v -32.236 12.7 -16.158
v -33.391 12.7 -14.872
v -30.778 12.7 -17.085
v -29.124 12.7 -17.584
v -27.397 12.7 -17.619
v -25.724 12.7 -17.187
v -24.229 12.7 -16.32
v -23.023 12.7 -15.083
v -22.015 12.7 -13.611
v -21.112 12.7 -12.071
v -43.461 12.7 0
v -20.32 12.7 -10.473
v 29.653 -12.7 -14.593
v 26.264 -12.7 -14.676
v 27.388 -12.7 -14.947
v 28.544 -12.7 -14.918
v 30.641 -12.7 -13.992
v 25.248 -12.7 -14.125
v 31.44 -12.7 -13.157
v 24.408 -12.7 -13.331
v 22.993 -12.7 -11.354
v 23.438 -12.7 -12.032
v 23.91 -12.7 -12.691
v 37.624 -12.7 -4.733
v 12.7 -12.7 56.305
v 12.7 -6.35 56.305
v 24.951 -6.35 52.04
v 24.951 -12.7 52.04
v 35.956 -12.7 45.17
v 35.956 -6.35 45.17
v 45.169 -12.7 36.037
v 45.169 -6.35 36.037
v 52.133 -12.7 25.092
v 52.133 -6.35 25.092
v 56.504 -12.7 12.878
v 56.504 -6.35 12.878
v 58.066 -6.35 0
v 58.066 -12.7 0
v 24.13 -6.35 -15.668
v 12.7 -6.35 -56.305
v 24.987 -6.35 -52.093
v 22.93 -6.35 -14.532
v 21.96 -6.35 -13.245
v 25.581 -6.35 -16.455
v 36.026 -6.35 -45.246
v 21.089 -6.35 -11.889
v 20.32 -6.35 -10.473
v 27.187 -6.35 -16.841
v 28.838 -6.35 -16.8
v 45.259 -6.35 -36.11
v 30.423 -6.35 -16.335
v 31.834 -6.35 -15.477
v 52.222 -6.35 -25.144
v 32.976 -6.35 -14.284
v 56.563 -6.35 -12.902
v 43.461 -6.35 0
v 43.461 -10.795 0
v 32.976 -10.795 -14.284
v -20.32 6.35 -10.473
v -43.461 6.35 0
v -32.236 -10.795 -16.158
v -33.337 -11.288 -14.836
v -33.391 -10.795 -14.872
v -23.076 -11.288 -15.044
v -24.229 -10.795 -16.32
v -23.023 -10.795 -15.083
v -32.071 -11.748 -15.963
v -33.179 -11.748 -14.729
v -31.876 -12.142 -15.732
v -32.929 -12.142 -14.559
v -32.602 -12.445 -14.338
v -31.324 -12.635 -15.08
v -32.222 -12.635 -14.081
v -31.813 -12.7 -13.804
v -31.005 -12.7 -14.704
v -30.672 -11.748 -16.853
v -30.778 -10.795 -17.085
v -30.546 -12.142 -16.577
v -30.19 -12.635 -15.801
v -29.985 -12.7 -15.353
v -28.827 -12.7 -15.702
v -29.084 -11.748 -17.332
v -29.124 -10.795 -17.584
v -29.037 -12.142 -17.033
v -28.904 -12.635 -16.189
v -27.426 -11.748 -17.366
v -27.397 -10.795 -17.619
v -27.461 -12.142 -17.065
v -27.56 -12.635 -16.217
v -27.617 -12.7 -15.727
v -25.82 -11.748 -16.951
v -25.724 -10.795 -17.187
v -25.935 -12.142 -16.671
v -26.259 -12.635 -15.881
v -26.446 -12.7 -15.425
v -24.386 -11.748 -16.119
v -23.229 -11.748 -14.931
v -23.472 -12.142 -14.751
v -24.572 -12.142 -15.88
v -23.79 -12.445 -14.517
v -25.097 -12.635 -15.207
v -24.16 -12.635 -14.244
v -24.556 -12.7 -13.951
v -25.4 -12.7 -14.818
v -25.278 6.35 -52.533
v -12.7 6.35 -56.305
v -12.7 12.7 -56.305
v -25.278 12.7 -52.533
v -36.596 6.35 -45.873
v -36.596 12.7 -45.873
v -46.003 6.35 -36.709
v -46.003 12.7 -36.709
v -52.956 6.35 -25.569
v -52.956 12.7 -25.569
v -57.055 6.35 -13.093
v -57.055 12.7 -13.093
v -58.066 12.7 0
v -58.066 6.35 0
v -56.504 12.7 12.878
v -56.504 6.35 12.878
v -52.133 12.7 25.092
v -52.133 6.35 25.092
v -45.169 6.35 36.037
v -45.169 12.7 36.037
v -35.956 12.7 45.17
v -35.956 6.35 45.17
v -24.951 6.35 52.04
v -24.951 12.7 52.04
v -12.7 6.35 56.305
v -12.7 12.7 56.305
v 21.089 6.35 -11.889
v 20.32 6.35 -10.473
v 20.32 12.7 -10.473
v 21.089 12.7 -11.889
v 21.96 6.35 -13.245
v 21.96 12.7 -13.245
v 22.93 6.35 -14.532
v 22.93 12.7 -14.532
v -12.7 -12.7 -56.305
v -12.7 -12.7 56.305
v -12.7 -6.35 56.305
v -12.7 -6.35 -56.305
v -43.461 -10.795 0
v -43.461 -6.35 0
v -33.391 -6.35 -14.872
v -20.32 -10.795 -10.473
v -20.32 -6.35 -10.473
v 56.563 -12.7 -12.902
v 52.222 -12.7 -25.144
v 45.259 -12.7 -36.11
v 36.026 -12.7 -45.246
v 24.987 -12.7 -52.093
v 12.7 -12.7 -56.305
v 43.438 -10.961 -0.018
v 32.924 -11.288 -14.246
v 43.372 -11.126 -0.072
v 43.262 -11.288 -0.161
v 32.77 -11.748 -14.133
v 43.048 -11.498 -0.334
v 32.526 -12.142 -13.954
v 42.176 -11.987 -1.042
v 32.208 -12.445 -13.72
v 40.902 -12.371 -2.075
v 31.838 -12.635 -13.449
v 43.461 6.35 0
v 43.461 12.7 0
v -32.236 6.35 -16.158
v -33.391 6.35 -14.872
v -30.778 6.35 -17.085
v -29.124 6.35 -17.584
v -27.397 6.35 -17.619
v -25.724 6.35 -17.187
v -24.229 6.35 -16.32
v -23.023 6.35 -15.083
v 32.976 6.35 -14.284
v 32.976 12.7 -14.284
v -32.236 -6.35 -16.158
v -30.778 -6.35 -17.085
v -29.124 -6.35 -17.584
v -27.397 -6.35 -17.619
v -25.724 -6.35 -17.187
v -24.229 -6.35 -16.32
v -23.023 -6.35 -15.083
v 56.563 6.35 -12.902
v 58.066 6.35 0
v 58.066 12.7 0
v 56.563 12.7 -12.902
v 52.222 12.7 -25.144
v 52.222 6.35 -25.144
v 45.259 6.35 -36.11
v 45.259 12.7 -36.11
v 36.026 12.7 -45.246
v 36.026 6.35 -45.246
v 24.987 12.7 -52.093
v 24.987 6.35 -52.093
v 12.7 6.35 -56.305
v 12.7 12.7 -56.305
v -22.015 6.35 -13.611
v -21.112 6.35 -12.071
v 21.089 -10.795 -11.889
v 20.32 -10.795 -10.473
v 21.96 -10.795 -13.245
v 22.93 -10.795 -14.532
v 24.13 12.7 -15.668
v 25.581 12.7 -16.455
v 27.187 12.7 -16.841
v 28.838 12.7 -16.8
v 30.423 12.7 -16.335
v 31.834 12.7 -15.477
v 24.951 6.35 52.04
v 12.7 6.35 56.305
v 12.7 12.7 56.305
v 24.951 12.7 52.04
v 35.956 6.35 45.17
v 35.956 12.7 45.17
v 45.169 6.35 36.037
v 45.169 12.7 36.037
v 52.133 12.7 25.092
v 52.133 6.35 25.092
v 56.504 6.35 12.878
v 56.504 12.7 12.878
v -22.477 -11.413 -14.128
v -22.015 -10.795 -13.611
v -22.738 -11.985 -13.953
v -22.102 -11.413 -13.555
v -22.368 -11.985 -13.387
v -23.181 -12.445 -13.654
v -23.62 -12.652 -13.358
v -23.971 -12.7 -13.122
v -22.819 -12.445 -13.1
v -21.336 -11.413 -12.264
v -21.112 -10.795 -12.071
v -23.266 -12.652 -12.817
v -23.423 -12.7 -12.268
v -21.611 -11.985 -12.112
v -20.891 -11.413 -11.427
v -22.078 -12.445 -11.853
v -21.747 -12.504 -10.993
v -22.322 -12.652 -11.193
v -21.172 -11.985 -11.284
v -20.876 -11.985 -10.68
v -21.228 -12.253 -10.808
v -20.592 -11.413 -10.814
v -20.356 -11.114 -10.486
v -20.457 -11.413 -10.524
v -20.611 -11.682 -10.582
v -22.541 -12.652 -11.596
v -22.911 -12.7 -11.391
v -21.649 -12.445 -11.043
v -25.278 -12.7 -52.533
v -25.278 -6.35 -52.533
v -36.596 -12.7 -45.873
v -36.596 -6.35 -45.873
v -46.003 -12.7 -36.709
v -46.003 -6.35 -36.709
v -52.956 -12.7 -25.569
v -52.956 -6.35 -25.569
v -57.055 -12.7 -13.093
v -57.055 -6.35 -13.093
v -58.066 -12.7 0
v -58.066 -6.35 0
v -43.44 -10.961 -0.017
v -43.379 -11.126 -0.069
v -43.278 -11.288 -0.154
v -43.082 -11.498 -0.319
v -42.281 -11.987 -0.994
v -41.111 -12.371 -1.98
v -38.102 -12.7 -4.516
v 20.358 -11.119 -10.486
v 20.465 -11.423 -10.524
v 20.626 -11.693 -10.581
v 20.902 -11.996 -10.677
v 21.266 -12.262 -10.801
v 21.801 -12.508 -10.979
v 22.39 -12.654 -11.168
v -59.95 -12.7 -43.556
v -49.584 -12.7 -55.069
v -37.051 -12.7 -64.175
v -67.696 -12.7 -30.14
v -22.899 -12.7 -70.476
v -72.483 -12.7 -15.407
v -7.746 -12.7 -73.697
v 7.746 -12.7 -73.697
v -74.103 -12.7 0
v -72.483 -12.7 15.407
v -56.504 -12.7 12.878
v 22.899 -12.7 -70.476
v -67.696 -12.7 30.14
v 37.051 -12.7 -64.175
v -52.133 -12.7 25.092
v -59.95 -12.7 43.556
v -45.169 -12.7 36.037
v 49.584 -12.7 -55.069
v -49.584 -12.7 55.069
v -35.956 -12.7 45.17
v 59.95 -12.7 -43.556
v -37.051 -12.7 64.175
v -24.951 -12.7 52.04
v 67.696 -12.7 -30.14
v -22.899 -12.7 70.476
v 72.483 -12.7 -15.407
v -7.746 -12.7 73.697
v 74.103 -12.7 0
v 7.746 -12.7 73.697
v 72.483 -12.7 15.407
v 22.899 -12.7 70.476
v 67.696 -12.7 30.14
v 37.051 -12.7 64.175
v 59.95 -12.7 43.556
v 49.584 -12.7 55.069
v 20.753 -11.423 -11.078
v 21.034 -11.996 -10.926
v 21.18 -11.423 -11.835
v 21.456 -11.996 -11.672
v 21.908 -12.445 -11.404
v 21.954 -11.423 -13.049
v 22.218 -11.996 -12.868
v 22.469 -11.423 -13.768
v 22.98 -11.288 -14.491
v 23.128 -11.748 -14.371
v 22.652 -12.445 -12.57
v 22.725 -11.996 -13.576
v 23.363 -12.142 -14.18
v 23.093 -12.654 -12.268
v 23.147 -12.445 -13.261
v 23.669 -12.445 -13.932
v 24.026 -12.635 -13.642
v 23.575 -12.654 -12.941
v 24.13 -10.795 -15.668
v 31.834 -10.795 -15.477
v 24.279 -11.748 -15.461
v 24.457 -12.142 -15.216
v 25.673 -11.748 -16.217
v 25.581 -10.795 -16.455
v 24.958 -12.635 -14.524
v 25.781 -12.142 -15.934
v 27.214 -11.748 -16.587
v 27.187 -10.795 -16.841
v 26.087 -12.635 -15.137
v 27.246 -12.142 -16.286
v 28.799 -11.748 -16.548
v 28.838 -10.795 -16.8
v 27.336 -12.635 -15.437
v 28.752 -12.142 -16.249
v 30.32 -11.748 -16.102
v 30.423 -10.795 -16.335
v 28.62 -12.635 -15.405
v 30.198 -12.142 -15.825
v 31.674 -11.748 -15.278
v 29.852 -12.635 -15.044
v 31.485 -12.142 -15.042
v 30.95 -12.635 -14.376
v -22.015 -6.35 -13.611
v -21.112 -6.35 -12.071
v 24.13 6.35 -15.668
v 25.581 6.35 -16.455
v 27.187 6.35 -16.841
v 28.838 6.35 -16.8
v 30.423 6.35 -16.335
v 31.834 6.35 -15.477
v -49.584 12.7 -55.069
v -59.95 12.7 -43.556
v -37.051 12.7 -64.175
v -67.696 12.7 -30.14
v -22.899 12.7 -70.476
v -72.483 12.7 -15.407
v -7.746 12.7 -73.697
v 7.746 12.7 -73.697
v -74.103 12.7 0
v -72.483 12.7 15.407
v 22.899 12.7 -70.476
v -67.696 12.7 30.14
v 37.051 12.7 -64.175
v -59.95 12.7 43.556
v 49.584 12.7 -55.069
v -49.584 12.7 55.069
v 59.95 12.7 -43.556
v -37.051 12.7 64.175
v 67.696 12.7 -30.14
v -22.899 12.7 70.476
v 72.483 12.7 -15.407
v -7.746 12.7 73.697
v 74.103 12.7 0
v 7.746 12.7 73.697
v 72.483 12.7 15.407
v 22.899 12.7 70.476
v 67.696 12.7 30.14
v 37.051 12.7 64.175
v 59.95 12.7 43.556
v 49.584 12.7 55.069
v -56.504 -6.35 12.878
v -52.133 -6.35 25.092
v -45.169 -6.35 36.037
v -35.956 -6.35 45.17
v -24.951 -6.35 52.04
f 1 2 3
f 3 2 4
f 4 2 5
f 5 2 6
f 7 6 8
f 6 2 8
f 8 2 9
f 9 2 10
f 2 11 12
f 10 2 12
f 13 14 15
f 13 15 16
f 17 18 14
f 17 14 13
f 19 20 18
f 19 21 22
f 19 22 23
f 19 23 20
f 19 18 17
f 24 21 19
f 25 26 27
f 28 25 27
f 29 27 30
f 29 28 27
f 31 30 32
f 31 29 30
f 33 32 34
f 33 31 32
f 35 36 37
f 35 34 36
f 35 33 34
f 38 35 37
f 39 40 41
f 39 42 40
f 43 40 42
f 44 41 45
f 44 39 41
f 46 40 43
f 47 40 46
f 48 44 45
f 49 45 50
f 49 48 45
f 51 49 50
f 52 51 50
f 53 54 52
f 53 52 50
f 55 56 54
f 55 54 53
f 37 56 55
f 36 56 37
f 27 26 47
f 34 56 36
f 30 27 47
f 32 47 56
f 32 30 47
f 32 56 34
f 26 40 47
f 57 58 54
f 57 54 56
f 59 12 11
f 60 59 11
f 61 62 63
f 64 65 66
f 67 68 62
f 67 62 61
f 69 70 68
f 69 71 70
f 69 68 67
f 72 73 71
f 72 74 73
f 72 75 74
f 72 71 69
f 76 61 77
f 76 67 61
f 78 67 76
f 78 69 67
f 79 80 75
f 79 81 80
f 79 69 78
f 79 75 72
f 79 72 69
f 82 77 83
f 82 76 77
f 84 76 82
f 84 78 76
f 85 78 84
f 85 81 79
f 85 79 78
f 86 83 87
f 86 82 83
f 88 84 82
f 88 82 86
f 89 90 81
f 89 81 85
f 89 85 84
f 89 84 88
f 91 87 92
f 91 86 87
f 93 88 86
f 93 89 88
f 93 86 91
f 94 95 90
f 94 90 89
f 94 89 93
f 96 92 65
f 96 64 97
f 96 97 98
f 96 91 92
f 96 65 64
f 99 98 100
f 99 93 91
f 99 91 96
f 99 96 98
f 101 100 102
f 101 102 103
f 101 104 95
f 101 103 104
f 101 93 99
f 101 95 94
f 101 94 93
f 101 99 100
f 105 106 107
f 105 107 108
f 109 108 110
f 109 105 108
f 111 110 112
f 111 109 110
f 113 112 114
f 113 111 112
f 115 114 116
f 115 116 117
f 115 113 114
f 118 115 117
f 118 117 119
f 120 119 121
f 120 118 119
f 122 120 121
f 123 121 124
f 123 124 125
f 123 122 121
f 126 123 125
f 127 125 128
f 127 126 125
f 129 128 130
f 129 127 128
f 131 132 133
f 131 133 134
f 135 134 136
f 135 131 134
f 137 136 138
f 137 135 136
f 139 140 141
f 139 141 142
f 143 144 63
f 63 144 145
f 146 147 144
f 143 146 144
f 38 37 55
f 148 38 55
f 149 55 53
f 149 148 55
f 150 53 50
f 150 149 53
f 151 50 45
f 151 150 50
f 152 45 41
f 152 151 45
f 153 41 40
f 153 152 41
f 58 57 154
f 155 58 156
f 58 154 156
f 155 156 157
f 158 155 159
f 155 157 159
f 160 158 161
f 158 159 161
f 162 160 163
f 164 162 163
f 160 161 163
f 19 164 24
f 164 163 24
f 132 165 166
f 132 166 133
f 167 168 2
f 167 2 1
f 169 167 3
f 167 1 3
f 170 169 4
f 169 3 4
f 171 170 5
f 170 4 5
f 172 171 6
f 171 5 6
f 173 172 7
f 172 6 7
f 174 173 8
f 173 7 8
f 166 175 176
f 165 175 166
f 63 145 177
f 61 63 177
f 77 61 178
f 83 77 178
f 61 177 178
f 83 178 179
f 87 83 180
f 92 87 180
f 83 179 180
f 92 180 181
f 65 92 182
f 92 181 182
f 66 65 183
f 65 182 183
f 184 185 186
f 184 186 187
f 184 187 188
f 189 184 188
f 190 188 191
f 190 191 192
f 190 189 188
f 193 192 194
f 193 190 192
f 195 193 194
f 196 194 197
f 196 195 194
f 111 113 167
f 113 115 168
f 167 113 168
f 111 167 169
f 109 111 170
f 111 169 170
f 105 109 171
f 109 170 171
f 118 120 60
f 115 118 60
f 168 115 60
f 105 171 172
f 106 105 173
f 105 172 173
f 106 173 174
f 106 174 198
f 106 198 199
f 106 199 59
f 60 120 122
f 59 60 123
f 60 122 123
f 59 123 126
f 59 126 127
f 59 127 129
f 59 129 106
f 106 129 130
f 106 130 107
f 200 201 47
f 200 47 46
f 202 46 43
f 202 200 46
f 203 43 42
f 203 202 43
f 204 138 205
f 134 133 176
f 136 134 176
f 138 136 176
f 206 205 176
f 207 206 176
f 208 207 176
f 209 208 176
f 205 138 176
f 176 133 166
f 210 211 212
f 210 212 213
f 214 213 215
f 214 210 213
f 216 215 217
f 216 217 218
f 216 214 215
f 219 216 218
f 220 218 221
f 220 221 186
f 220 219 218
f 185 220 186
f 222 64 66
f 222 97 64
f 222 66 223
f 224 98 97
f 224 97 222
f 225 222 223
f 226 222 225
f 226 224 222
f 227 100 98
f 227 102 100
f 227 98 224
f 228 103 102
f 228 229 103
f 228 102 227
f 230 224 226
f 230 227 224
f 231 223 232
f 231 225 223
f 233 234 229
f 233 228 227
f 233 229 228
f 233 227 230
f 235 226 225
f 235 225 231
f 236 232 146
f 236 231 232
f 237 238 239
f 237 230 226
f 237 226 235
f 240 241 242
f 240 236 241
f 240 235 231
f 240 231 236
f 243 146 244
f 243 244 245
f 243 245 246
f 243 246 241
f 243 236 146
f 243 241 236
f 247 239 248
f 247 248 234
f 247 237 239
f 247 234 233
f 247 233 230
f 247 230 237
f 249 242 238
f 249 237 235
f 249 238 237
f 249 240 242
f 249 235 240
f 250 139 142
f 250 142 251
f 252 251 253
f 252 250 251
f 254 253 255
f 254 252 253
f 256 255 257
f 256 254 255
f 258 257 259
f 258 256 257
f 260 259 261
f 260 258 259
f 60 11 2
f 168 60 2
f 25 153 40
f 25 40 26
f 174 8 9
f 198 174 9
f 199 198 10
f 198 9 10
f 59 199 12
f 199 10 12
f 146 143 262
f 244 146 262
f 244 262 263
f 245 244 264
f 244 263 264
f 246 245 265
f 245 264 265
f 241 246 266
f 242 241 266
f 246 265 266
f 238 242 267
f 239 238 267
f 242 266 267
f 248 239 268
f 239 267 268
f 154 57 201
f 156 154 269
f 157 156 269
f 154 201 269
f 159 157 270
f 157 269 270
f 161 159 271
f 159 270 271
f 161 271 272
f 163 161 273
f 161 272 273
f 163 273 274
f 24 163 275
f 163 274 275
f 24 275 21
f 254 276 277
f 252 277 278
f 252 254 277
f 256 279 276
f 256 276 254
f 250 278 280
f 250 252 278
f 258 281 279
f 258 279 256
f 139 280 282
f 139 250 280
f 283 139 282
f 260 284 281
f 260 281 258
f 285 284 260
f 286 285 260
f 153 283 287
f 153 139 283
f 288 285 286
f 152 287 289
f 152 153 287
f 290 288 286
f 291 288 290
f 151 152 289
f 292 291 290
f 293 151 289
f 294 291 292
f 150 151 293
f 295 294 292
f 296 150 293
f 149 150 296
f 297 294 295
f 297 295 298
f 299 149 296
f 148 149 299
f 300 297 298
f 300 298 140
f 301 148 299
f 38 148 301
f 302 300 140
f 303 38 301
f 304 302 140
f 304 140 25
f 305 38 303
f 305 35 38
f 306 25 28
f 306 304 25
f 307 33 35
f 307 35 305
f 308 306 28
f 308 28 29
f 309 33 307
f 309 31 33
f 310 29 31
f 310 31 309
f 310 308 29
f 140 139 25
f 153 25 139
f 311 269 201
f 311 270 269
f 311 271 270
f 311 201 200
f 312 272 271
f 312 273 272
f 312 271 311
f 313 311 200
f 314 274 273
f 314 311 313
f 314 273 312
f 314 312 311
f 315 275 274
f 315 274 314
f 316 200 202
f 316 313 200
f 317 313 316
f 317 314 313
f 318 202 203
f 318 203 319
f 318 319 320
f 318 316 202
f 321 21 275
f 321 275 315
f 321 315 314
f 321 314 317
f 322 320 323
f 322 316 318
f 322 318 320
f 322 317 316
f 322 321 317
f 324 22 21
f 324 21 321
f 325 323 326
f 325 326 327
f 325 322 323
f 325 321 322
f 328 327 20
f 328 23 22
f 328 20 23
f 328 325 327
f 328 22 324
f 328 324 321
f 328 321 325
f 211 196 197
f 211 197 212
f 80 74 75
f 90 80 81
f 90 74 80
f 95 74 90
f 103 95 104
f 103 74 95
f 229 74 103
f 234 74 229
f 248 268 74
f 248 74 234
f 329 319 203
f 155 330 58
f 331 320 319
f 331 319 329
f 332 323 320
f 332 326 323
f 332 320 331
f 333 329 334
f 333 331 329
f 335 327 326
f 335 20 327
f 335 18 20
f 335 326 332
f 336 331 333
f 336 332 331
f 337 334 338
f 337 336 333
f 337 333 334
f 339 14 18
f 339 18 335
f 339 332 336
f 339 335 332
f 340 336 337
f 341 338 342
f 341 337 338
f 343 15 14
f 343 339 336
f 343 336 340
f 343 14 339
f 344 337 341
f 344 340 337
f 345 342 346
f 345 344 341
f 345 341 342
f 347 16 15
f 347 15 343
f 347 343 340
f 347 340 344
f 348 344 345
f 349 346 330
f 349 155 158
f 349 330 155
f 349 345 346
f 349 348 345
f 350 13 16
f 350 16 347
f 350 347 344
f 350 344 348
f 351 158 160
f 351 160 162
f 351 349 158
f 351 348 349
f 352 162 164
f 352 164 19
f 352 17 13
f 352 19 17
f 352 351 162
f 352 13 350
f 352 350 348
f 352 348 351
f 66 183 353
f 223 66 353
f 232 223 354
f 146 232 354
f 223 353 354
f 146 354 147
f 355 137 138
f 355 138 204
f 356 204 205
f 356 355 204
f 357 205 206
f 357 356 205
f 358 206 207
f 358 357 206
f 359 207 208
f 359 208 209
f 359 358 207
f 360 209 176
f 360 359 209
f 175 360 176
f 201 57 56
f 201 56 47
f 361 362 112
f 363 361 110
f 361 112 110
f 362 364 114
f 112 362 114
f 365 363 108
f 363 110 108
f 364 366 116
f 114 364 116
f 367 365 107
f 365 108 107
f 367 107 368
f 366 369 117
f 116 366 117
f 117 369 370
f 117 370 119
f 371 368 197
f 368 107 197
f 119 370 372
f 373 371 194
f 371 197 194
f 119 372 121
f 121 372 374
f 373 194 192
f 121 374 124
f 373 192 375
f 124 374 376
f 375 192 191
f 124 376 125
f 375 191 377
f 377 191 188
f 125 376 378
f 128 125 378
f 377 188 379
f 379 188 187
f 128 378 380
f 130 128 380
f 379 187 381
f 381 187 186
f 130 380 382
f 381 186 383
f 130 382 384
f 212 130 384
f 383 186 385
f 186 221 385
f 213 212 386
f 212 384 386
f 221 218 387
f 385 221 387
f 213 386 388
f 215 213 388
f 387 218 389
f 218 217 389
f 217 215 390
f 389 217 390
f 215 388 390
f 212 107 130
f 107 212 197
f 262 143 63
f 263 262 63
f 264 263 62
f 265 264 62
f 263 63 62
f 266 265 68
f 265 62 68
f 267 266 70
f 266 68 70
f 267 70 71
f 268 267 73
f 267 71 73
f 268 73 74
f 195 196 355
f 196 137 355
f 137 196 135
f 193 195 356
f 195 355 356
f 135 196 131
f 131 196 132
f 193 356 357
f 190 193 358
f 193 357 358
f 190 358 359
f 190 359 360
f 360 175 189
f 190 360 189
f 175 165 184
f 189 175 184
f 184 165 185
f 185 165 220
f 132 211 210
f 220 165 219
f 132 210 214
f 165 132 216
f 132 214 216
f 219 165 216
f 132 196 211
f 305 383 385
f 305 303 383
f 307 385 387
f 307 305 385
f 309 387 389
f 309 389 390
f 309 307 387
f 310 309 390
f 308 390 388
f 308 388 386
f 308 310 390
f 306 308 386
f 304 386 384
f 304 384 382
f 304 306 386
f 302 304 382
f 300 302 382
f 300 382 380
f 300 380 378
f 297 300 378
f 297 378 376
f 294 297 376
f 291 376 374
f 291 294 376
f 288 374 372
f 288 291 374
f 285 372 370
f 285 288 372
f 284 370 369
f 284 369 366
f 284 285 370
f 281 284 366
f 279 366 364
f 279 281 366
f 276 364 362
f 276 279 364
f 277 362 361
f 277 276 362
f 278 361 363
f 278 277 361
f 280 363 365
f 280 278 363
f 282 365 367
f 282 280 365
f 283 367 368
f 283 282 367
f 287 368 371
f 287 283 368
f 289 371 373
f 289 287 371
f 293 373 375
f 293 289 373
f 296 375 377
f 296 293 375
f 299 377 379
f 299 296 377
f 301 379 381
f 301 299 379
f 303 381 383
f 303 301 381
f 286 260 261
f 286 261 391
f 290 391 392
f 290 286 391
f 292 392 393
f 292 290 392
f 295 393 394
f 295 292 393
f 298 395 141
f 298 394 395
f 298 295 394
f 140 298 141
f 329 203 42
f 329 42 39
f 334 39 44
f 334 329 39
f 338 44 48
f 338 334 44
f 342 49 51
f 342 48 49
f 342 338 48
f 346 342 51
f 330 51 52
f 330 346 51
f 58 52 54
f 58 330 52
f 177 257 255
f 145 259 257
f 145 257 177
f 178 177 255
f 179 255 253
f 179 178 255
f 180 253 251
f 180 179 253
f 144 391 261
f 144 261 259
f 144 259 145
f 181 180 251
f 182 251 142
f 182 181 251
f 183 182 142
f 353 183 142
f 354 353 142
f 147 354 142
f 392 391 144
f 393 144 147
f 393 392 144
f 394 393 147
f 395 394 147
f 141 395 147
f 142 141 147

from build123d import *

# Parameters (mm, degrees)
F0_R     = 74.1026
F1_DEPTH = 12.7
F2_DEPTH = 6.35
F3_DEPTH = 12.7
F4_R     = 1.905


with BuildPart() as f1:
    # F0 (on Front) → F1 (new body, symmetric)
    with BuildSketch(Plane.XZ):
        Circle(F0_R)
        with BuildLine():
            Line((12.7, -56.305081), (12.7, 56.305081))
            ThreePointArc((12.7, 56.305081), (45.16875, 36.037206), (58.065501, 0))
            ThreePointArc((58.065501, 0), (45.258761, -36.10973), (12.7, -56.305081))
        make_face(mode=Mode.SUBTRACT)
        with BuildLine():
            ThreePointArc((-58.065501, 0), (-45.16875, 36.037206), (-12.7, 56.305081))
            Line((-12.7, 56.305081), (-12.7, -56.305081))
            ThreePointArc((-12.7, -56.305081), (-46.002553, -36.709009), (-58.065501, 0))
        make_face(mode=Mode.SUBTRACT)
    extrude(amount=F1_DEPTH, both=True)

    # F0 (on Front) → F2 (join, symmetric)
    with BuildSketch(Plane.XZ):
        with BuildLine():
            Line((-12.7, -56.305081), (-12.7, 56.305081))
            ThreePointArc((-12.7, 56.305081), (-45.16875, 36.037206), (-58.065501, 0))
            ThreePointArc((-58.065501, 0), (-46.002553, -36.709009), (-12.7, -56.305081))
        make_face()
        with BuildLine():
            Line((-43.460501, 0), (-20.32, -10.472688))
            ThreePointArc((-20.32, -10.472688), (-21.550138, -12.848968), (-23.023436, -15.082651))
            ThreePointArc((-23.023436, -15.082651), (-28.261599, -17.66068), (-33.390806, -14.872163))
            Line((-33.390806, -14.872163), (-43.460501, 0))
        make_face(mode=Mode.SUBTRACT)
        with BuildLine():
            ThreePointArc((58.065501, 0), (45.16875, 36.037206), (12.7, 56.305081))
            Line((12.7, 56.305081), (12.7, -56.305081))
            ThreePointArc((12.7, -56.305081), (45.258761, -36.10973), (58.065501, 0))
        make_face()
        with BuildLine():
            ThreePointArc((22.929982, -14.532426), (21.511965, -12.57522), (20.32, -10.472688))
            Line((20.32, -10.472688), (43.460501, 0))
            Line((43.460501, 0), (32.976203, -14.284045))
            ThreePointArc((32.976203, -14.284045), (28.014074, -16.874772), (22.929982, -14.532426))
        make_face(mode=Mode.SUBTRACT)
    extrude(amount=F2_DEPTH, both=True)

    # F0 (on Front) → F3 (join, symmetric)
    with BuildSketch(Plane.XZ):
        with BuildLine():
            ThreePointArc((-23.023436, -15.082651), (-21.550138, -12.848968), (-20.32, -10.472688))
            Line((-20.32, -10.472688), (-43.460501, 0))
            Line((-43.460501, 0), (-33.390806, -14.872163))
            ThreePointArc((-33.390806, -14.872163), (-28.261599, -17.66068), (-23.023436, -15.082651))
        make_face()
        with BuildLine():
            Line((43.460501, 0), (20.32, -10.472688))
            ThreePointArc((20.32, -10.472688), (21.511965, -12.57522), (22.929982, -14.532426))
            ThreePointArc((22.929982, -14.532426), (28.014074, -16.874772), (32.976203, -14.284045))
            Line((32.976203, -14.284045), (43.460501, 0))
        make_face()
    extrude(amount=F3_DEPTH, both=True)

    # F4
    f4_edges = [f1.edges().sort_by_distance(p)[0] for p in [
        (-38.425654, -12.7, -7.436082),
        (38.218352, -12.7, -7.142023),
        (-31.890251, -12.7, -5.236344),
        (31.890251, -12.7, -5.236344),
    ]]
    fillet(f4_edges, radius=F4_R)


solid = f1.part
